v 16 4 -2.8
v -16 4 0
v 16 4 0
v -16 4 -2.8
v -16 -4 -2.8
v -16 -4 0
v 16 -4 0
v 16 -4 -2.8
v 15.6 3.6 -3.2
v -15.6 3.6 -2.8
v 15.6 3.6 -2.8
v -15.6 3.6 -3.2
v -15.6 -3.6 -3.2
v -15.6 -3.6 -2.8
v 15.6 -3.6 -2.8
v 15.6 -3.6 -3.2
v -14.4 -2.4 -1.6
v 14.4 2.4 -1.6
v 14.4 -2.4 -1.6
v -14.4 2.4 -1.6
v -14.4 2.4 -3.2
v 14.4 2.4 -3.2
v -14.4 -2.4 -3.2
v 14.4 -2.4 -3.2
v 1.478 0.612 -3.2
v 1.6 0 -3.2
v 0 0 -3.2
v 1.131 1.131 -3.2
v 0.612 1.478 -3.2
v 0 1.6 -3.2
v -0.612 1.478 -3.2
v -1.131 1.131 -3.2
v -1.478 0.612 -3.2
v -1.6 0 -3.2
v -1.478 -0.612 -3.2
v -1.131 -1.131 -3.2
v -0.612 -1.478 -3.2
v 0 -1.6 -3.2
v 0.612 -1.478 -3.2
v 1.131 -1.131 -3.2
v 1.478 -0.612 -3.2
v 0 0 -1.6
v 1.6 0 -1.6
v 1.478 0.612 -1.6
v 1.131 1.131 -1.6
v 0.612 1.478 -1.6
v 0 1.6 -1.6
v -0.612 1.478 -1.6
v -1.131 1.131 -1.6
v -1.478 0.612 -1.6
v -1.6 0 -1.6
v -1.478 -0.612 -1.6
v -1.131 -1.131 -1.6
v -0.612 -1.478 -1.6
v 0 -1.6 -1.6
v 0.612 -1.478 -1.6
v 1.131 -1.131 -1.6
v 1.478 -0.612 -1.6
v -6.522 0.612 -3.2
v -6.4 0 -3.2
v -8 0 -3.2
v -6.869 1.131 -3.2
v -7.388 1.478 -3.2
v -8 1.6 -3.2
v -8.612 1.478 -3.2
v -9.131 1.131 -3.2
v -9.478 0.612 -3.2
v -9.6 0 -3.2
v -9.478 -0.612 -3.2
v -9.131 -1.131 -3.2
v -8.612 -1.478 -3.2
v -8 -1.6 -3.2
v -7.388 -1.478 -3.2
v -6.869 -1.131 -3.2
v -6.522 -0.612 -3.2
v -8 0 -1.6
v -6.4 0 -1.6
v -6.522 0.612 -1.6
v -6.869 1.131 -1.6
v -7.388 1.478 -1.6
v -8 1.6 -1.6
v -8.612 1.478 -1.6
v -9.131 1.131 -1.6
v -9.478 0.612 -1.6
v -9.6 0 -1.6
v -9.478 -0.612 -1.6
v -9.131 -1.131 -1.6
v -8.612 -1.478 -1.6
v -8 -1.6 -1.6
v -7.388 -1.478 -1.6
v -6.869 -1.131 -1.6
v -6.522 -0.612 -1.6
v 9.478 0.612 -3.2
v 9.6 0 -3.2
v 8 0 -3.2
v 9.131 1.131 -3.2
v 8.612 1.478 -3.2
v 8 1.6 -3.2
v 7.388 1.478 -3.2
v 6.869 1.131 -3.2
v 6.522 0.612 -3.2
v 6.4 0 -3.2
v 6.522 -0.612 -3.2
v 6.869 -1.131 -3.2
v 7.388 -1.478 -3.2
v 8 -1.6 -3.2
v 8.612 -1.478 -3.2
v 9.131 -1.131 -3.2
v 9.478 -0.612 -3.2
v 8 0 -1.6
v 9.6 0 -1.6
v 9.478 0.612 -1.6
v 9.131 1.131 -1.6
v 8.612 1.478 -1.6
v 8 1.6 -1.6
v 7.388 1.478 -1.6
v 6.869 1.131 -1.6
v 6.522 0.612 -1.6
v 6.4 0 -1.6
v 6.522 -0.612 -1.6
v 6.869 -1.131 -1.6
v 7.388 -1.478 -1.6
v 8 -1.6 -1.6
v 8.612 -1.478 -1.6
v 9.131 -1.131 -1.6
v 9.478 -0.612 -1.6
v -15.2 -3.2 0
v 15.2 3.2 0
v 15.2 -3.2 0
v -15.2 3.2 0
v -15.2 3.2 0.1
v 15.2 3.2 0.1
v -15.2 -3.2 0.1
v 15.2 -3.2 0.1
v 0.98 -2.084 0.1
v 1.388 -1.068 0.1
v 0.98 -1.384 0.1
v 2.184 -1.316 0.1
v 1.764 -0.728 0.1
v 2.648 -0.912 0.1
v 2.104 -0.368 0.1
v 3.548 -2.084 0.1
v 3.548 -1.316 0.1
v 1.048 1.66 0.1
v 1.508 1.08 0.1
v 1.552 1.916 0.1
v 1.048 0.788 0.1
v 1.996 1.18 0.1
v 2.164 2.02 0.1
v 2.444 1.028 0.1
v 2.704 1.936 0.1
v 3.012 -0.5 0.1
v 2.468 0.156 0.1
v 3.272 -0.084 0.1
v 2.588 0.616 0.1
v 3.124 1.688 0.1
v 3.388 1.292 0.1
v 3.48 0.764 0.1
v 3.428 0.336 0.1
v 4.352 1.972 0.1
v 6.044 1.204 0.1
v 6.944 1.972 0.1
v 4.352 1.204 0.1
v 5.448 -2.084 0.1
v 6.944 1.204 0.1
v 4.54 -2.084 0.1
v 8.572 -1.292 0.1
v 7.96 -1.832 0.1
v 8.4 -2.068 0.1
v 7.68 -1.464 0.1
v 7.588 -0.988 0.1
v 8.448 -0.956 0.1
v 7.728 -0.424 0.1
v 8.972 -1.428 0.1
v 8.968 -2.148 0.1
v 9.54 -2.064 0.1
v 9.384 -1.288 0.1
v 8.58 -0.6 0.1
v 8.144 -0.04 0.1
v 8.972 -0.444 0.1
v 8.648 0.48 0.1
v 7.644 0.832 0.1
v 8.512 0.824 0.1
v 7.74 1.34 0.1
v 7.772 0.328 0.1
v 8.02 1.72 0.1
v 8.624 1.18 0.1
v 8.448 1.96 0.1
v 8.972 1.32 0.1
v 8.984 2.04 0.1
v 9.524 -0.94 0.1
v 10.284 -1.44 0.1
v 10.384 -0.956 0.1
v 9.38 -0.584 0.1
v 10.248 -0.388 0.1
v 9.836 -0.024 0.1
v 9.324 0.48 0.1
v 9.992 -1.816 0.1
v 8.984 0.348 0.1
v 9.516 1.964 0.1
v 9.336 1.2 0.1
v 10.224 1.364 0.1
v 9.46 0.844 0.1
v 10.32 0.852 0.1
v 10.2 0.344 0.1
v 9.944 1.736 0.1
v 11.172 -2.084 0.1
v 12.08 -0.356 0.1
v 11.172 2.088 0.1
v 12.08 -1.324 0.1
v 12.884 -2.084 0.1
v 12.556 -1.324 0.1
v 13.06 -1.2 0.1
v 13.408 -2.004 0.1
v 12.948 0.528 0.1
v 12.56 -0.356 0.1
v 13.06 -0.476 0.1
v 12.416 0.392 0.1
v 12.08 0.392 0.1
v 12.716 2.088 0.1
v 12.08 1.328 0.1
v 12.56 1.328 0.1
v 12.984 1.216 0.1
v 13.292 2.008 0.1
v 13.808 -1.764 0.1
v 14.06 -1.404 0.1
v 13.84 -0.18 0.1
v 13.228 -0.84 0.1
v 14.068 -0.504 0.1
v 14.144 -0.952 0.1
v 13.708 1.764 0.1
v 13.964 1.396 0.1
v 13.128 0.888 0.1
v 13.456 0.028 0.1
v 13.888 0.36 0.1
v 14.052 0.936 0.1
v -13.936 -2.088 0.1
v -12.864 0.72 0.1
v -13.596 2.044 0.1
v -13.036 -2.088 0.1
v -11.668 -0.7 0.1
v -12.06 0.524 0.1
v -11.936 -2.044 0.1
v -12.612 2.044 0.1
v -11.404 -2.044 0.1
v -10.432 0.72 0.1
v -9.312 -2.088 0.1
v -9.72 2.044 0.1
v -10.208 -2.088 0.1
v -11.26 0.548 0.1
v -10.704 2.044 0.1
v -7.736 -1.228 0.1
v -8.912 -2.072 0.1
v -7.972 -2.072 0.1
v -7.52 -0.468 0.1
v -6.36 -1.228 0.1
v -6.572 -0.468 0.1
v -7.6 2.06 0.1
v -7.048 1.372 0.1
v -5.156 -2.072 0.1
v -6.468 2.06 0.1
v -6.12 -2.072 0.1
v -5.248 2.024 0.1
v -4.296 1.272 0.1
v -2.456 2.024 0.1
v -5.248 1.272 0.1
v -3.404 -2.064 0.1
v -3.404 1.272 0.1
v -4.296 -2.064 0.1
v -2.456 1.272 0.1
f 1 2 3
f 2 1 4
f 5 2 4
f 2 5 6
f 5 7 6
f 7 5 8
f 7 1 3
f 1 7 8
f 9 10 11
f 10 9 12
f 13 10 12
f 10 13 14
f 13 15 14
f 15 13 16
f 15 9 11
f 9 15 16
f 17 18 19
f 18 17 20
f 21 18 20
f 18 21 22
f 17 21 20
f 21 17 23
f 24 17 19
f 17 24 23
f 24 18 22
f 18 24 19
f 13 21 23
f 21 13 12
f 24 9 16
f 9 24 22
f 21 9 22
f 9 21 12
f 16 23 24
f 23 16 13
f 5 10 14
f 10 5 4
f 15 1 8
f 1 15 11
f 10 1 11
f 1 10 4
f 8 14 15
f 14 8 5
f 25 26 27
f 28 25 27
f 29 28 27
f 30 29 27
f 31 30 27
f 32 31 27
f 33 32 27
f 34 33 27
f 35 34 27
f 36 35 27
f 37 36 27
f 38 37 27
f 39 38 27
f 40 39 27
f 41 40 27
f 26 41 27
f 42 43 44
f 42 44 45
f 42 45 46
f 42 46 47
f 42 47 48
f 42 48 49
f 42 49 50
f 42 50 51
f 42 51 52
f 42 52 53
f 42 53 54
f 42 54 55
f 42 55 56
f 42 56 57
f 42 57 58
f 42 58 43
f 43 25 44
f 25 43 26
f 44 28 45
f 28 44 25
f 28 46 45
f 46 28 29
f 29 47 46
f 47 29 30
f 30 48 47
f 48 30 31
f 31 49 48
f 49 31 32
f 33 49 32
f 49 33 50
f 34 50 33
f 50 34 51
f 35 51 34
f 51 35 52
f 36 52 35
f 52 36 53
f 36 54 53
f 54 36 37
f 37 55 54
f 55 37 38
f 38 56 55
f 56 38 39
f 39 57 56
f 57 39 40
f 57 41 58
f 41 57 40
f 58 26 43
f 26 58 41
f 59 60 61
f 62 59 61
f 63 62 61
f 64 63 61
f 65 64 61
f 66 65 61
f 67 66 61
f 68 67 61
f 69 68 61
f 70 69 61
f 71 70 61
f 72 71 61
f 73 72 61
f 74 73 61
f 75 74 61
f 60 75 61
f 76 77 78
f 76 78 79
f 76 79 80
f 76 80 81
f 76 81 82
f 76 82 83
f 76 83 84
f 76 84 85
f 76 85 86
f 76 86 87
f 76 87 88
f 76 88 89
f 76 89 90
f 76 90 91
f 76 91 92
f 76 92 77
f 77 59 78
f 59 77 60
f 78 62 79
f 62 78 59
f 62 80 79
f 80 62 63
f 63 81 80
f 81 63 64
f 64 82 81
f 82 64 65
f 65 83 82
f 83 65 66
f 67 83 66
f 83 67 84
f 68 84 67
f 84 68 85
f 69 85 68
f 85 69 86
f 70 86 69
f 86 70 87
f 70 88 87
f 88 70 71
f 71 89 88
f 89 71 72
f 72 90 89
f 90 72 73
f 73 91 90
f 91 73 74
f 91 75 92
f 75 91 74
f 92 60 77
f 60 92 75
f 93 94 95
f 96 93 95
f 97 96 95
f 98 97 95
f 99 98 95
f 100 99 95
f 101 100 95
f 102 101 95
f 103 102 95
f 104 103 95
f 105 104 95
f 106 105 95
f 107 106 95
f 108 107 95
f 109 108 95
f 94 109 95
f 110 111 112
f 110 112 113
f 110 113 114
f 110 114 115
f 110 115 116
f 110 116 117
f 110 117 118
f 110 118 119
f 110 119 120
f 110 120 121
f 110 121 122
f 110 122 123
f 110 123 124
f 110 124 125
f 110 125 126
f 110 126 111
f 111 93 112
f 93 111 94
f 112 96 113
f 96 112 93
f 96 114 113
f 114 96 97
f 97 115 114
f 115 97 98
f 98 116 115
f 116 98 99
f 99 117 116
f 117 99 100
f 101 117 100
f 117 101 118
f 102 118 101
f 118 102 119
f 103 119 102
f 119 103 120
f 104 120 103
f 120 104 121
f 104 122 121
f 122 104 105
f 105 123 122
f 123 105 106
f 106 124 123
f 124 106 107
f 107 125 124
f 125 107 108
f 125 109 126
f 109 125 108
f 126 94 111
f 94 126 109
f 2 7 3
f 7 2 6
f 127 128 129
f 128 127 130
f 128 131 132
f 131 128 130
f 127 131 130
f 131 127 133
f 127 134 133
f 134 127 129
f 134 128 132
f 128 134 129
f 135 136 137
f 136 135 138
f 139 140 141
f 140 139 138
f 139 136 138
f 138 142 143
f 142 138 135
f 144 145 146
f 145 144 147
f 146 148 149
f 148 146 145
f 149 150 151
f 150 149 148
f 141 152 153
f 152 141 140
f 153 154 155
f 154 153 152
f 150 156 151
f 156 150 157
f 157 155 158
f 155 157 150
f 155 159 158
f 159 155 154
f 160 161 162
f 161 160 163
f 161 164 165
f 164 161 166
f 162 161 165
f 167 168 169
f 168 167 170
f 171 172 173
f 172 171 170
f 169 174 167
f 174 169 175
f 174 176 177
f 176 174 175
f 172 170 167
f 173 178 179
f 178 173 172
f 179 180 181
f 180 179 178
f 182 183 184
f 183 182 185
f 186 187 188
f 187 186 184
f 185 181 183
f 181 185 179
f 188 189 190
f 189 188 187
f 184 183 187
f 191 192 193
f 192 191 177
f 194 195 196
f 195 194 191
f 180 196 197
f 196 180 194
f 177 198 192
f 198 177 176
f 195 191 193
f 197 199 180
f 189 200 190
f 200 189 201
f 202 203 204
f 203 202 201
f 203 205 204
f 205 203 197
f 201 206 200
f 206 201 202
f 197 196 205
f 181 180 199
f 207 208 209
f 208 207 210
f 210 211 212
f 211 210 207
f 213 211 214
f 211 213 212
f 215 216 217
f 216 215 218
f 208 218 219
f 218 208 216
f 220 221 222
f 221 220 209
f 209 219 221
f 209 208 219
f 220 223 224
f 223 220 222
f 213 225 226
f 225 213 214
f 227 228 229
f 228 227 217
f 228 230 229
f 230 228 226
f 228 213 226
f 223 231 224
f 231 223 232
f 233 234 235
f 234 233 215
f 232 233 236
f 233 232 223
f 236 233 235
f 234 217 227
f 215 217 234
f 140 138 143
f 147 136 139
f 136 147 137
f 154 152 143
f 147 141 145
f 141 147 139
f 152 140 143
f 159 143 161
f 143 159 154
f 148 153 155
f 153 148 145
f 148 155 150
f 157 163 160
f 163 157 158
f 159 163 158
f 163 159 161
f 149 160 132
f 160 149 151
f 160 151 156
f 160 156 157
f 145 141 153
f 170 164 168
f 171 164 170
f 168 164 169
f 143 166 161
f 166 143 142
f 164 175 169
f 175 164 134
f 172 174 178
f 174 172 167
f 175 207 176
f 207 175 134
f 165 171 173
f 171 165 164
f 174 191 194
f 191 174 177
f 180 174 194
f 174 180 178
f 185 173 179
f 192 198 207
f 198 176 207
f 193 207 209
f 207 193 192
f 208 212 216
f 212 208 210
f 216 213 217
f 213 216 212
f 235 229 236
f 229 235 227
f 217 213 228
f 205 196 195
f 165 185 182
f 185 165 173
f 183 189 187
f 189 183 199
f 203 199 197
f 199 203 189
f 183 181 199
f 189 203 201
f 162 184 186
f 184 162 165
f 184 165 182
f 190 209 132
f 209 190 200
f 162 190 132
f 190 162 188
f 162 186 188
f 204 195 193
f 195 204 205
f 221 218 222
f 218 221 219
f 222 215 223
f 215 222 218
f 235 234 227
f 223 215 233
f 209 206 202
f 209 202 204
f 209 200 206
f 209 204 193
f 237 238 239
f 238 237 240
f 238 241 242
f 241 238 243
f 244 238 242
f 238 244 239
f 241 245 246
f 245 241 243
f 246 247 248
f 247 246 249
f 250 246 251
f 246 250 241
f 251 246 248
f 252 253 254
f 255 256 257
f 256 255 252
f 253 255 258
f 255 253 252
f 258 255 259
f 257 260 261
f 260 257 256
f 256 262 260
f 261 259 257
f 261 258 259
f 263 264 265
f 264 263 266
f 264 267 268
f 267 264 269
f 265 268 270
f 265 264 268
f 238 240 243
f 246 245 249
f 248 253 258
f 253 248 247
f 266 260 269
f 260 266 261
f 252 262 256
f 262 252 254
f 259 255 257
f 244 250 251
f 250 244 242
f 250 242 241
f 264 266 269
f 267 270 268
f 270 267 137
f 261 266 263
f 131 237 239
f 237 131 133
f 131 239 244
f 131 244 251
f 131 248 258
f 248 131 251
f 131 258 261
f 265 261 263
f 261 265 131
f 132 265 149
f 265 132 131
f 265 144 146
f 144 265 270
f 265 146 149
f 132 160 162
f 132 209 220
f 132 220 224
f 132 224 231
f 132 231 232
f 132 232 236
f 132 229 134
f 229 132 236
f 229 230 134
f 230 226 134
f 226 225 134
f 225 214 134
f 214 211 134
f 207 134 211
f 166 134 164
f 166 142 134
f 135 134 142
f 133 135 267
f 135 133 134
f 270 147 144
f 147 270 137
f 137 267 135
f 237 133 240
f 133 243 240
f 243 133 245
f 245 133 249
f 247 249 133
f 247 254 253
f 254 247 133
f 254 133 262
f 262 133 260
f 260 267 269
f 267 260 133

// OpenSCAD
// file: ../p/4-4edge.scad
use <../lib.scad>
function ldraw_lib__4_4edge() = [
// 0 Circle 1.0
// 0 Name: 4-4edge.dat
// 0 Author: James Jessiman
// 0 !LDRAW_ORG Primitive UPDATE 2017-01
// 0 !LICENSE Licensed under CC BY 2.0 and CC BY 4.0 : see CAreadme.txt
// 
// 0 BFC CERTIFY CCW
  [0,"BFC","CERTIFY"],
  [0,"BFC","CCW"],
// 
// 0 !HISTORY 1998-12-15 [PTadmin] Official Update 1998-10
// 0 !HISTORY 2005-12-28 [PTadmin] Official Update 2005-01
// 0 !HISTORY 2007-06-24 [PTadmin] Header formatted for Contributor Agreement
// 0 !HISTORY 2008-07-01 [PTadmin] Official Update 2008-01
// 0 !HISTORY 2017-01-15 [Steffen] BFCed
// 0 !HISTORY 2017-12-30 [PTadmin] Official Update 2017-01
// 
// 
// 2 24 1 0 0 0.9239 0 0.3827
  [2,24,1,0,0,0.9239,0,0.3827],
// 2 24 0.9239 0 0.3827 0.7071 0 0.7071
  [2,24,0.9239,0,0.3827,0.7071,0,0.7071],
// 2 24 0.7071 0 0.7071 0.3827 0 0.9239
  [2,24,0.7071,0,0.7071,0.3827,0,0.9239],
// 2 24 0.3827 0 0.9239 0 0 1
  [2,24,0.3827,0,0.9239,0,0,1],
// 2 24 0 0 1 -0.3827 0 0.9239
  [2,24,0,0,1,-0.3827,0,0.9239],
// 2 24 -0.3827 0 0.9239 -0.7071 0 0.7071
  [2,24,-0.3827,0,0.9239,-0.7071,0,0.7071],
// 2 24 -0.7071 0 0.7071 -0.9239 0 0.3827
  [2,24,-0.7071,0,0.7071,-0.9239,0,0.3827],
// 2 24 -0.9239 0 0.3827 -1 0 -0
  [2,24,-0.9239,0,0.3827,-1,0,-0],
// 2 24 -1 0 -0 -0.9239 0 -0.3827
  [2,24,-1,0,-0,-0.9239,0,-0.3827],
// 2 24 -0.9239 0 -0.3827 -0.7071 0 -0.7071
  [2,24,-0.9239,0,-0.3827,-0.7071,0,-0.7071],
// 2 24 -0.7071 0 -0.7071 -0.3827 0 -0.9239
  [2,24,-0.7071,0,-0.7071,-0.3827,0,-0.9239],
// 2 24 -0.3827 0 -0.9239 0 0 -1
  [2,24,-0.3827,0,-0.9239,0,0,-1],
// 2 24 0 0 -1 0.3827 0 -0.9239
  [2,24,0,0,-1,0.3827,0,-0.9239],
// 2 24 0.3827 0 -0.9239 0.7071 0 -0.7071
  [2,24,0.3827,0,-0.9239,0.7071,0,-0.7071],
// 2 24 0.7071 0 -0.7071 0.9239 0 -0.3827
  [2,24,0.7071,0,-0.7071,0.9239,0,-0.3827],
// 2 24 0.9239 0 -0.3827 1 0 0
  [2,24,0.9239,0,-0.3827,1,0,0],
];
module ldraw_lib__4_4edge(step=0, col=false, unit=2/5, alt=false, line=0.2, solid=!$preview)
    makepoly(ldraw_lib__4_4edge(), step=step, col=col, unit=unit, alt=alt, line=line, solid=solid);
ldraw_lib__4_4edge(line=0.2);
// file: ../p/4-4disc.scad
use <../lib.scad>
function ldraw_lib__4_4disc() = [
// 0 Disc 1.0
// 0 Name: 4-4disc.dat
// 0 Author: James Jessiman
// 0 !LDRAW_ORG Primitive UPDATE 2002-02
// 0 !LICENSE Licensed under CC BY 2.0 and CC BY 4.0 : see CAreadme.txt
// 
// 0 BFC CERTIFY CCW
  [0,"BFC","CERTIFY"],
  [0,"BFC","CCW"],
// 
// 0 !HISTORY 1998-12-15 [PTadmin] Official Update 1998-10
// 0 !HISTORY 2002-03-23 [sbliss] Added BFC statement
// 0 !HISTORY 2002-04-25 [PTadmin] Official Update 2002-02
// 0 !HISTORY 2007-06-24 [PTadmin] Header formatted for Contributor Agreement
// 0 !HISTORY 2008-07-01 [PTadmin] Official Update 2008-01
// 
// 
// 3 16 0 0 0 1 0 0 0.9239 0 0.3827
  [3,16,0,0,0,1,0,0,0.9239,0,0.3827],
// 3 16 0 0 0 0.9239 0 0.3827 0.7071 0 0.7071
  [3,16,0,0,0,0.9239,0,0.3827,0.7071,0,0.7071],
// 3 16 0 0 0 0.7071 0 0.7071 0.3827 0 0.9239
  [3,16,0,0,0,0.7071,0,0.7071,0.3827,0,0.9239],
// 3 16 0 0 0 0.3827 0 0.9239 0 0 1
  [3,16,0,0,0,0.3827,0,0.9239,0,0,1],
// 3 16 0 0 0 0 0 1 -0.3827 0 0.9239
  [3,16,0,0,0,0,0,1,-0.3827,0,0.9239],
// 3 16 0 0 0 -0.3827 0 0.9239 -0.7071 0 0.7071
  [3,16,0,0,0,-0.3827,0,0.9239,-0.7071,0,0.7071],
// 3 16 0 0 0 -0.7071 0 0.7071 -0.9239 0 0.3827
  [3,16,0,0,0,-0.7071,0,0.7071,-0.9239,0,0.3827],
// 3 16 0 0 0 -0.9239 0 0.3827 -1 0 -0
  [3,16,0,0,0,-0.9239,0,0.3827,-1,0,-0],
// 3 16 0 0 0 -1 0 -0 -0.9239 0 -0.3827
  [3,16,0,0,0,-1,0,-0,-0.9239,0,-0.3827],
// 3 16 0 0 0 -0.9239 0 -0.3827 -0.7071 0 -0.7071
  [3,16,0,0,0,-0.9239,0,-0.3827,-0.7071,0,-0.7071],
// 3 16 0 0 0 -0.7071 0 -0.7071 -0.3827 0 -0.9239
  [3,16,0,0,0,-0.7071,0,-0.7071,-0.3827,0,-0.9239],
// 3 16 0 0 0 -0.3827 0 -0.9239 0 0 -1
  [3,16,0,0,0,-0.3827,0,-0.9239,0,0,-1],
// 3 16 0 0 0 0 0 -1 0.3827 0 -0.9239
  [3,16,0,0,0,0,0,-1,0.3827,0,-0.9239],
// 3 16 0 0 0 0.3827 0 -0.9239 0.7071 0 -0.7071
  [3,16,0,0,0,0.3827,0,-0.9239,0.7071,0,-0.7071],
// 3 16 0 0 0 0.7071 0 -0.7071 0.9239 0 -0.3827
  [3,16,0,0,0,0.7071,0,-0.7071,0.9239,0,-0.3827],
// 3 16 0 0 0 0.9239 0 -0.3827 1 0 0
  [3,16,0,0,0,0.9239,0,-0.3827,1,0,0],
// 0
];
module ldraw_lib__4_4disc(step=0, col=false, unit=2/5, alt=false, line=0.2, solid=!$preview)
    makepoly(ldraw_lib__4_4disc(), step=step, col=col, unit=unit, alt=alt, line=line, solid=solid);
ldraw_lib__4_4disc(line=0.2);
// file: ../p/4-4cyli.scad
use <../lib.scad>
$fa=1; $fs=0.2;
function ldraw_lib__4_4cyli(realsolid=false) = [
// 0 Cylinder 1.0
// 0 Name: 4-4cyli.dat
// 0 Author: James Jessiman
// 0 !LDRAW_ORG Primitive UPDATE 2005-01
// 0 !LICENSE Licensed under CC BY 2.0 and CC BY 4.0 : see CAreadme.txt
// 
// 0 BFC CERTIFY CCW
  [0,"BFC","CERTIFY"],
  [0,"BFC","CCW"],
// 
// 0 !HISTORY 1998-12-15 [PTadmin] Official Update 1998-10
// 0 !HISTORY 2002-03-23 [sbliss] Added BFC statement; merged headers from files in distributions LDraw 0.27 and Complete.
// 0 !HISTORY 2002-04-25 [PTadmin] Official Update 2002-02
// 0 !HISTORY 2004-12-14 [guyvivan] BFC CCW
// 0 !HISTORY 2005-12-28 [PTadmin] Official Update 2005-01
// 0 !HISTORY 2007-06-24 [PTadmin] Header formatted for Contributor Agreement
// 0 !HISTORY 2008-07-01 [PTadmin] Official Update 2008-01
// 
// 
// 4 16 1 1 0 0.9239 1 0.3827 0.9239 0 0.3827 1 0 0
  [4,16,1,1,0,0.9239,1,0.3827,0.9239,0,0.3827,1,0,0],
// 5 24 1 0 0 1 1 0 0.9239 0 0.3827 0.9239 0 -0.3827
  [5,24,1,0,0,1,1,0,0.9239,0,0.3827,0.9239,0,-0.3827],
// 4 16 0.9239 1 0.3827 0.7071 1 0.7071 0.7071 0 0.7071 0.9239 0 0.3827
  [4,16,0.9239,1,0.3827,0.7071,1,0.7071,0.7071,0,0.7071,0.9239,0,0.3827],
// 5 24 0.9239 0 0.3827 0.9239 1 0.3827 0.7071 0 0.7071 1 0 0
  [5,24,0.9239,0,0.3827,0.9239,1,0.3827,0.7071,0,0.7071,1,0,0],
// 4 16 0.7071 1 0.7071 0.3827 1 0.9239 0.3827 0 0.9239 0.7071 0 0.7071
  [4,16,0.7071,1,0.7071,0.3827,1,0.9239,0.3827,0,0.9239,0.7071,0,0.7071],
// 5 24 0.7071 0 0.7071 0.7071 1 0.7071 0.3827 0 0.9239 0.9239 0 0.3827
  [5,24,0.7071,0,0.7071,0.7071,1,0.7071,0.3827,0,0.9239,0.9239,0,0.3827],
// 4 16 0.3827 1 0.9239 0 1 1 0 0 1 0.3827 0 0.9239
  [4,16,0.3827,1,0.9239,0,1,1,0,0,1,0.3827,0,0.9239],
// 5 24 0.3827 0 0.9239 0.3827 1 0.9239 0 0 1 0.7071 0 0.7071
  [5,24,0.3827,0,0.9239,0.3827,1,0.9239,0,0,1,0.7071,0,0.7071],
// 4 16 0 1 1 -0.3827 1 0.9239 -0.3827 0 0.9239 0 0 1
  [4,16,0,1,1,-0.3827,1,0.9239,-0.3827,0,0.9239,0,0,1],
// 5 24 0 0 1 0 1 1 -0.3827 0 0.9239 0.3827 0 0.9239
  [5,24,0,0,1,0,1,1,-0.3827,0,0.9239,0.3827,0,0.9239],
// 4 16 -0.3827 1 0.9239 -0.7071 1 0.7071 -0.7071 0 0.7071 -0.3827 0 0.9239
  [4,16,-0.3827,1,0.9239,-0.7071,1,0.7071,-0.7071,0,0.7071,-0.3827,0,0.9239],
// 5 24 -0.3827 0 0.9239 -0.3827 1 0.9239 -0.7071 0 0.7071 0 0 1
  [5,24,-0.3827,0,0.9239,-0.3827,1,0.9239,-0.7071,0,0.7071,0,0,1],
// 4 16 -0.7071 1 0.7071 -0.9239 1 0.3827 -0.9239 0 0.3827 -0.7071 0 0.7071
  [4,16,-0.7071,1,0.7071,-0.9239,1,0.3827,-0.9239,0,0.3827,-0.7071,0,0.7071],
// 5 24 -0.7071 0 0.7071 -0.7071 1 0.7071 -0.9239 0 0.3827 -0.3827 0 0.9239
  [5,24,-0.7071,0,0.7071,-0.7071,1,0.7071,-0.9239,0,0.3827,-0.3827,0,0.9239],
// 4 16 -0.9239 1 0.3827 -1 1 0 -1 0 0 -0.9239 0 0.3827
  [4,16,-0.9239,1,0.3827,-1,1,0,-1,0,0,-0.9239,0,0.3827],
// 5 24 -0.9239 0 0.3827 -0.9239 1 0.3827 -1 0 0 -0.7071 0 0.7071
  [5,24,-0.9239,0,0.3827,-0.9239,1,0.3827,-1,0,0,-0.7071,0,0.7071],
// 4 16 -1 1 0 -0.9239 1 -0.3827 -0.9239 0 -0.3827 -1 0 0
  [4,16,-1,1,0,-0.9239,1,-0.3827,-0.9239,0,-0.3827,-1,0,0],
// 5 24 -1 0 0 -1 1 0 -0.9239 0 -0.3827 -0.9239 0 0.3827
  [5,24,-1,0,0,-1,1,0,-0.9239,0,-0.3827,-0.9239,0,0.3827],
// 4 16 -0.9239 1 -0.3827 -0.7071 1 -0.7071 -0.7071 0 -0.7071 -0.9239 0 -0.3827
  [4,16,-0.9239,1,-0.3827,-0.7071,1,-0.7071,-0.7071,0,-0.7071,-0.9239,0,-0.3827],
// 5 24 -0.9239 0 -0.3827 -0.9239 1 -0.3827 -0.7071 0 -0.7071 -1 0 0
  [5,24,-0.9239,0,-0.3827,-0.9239,1,-0.3827,-0.7071,0,-0.7071,-1,0,0],
// 4 16 -0.7071 1 -0.7071 -0.3827 1 -0.9239 -0.3827 0 -0.9239 -0.7071 0 -0.7071
  [4,16,-0.7071,1,-0.7071,-0.3827,1,-0.9239,-0.3827,0,-0.9239,-0.7071,0,-0.7071],
// 5 24 -0.7071 0 -0.7071 -0.7071 1 -0.7071 -0.3827 0 -0.9239 -0.9239 0 -0.3827
  [5,24,-0.7071,0,-0.7071,-0.7071,1,-0.7071,-0.3827,0,-0.9239,-0.9239,0,-0.3827],
// 4 16 -0.3827 1 -0.9239 0 1 -1 0 0 -1 -0.3827 0 -0.9239
  [4,16,-0.3827,1,-0.9239,0,1,-1,0,0,-1,-0.3827,0,-0.9239],
// 5 24 -0.3827 0 -0.9239 -0.3827 1 -0.9239 0 0 -1 -0.7071 0 -0.7071
  [5,24,-0.3827,0,-0.9239,-0.3827,1,-0.9239,0,0,-1,-0.7071,0,-0.7071],
// 4 16 0 1 -1 0.3827 1 -0.9239 0.3827 0 -0.9239 0 0 -1
  [4,16,0,1,-1,0.3827,1,-0.9239,0.3827,0,-0.9239,0,0,-1],
// 5 24 0 0 -1 0 1 -1 0.3827 0 -0.9239 -0.3827 0 -0.9239
  [5,24,0,0,-1,0,1,-1,0.3827,0,-0.9239,-0.3827,0,-0.9239],
// 4 16 0.3827 1 -0.9239 0.7071 1 -0.7071 0.7071 0 -0.7071 0.3827 0 -0.9239
  [4,16,0.3827,1,-0.9239,0.7071,1,-0.7071,0.7071,0,-0.7071,0.3827,0,-0.9239],
// 5 24 0.3827 0 -0.9239 0.3827 1 -0.9239 0.7071 0 -0.7071 0 0 -1
  [5,24,0.3827,0,-0.9239,0.3827,1,-0.9239,0.7071,0,-0.7071,0,0,-1],
// 4 16 0.7071 1 -0.7071 0.9239 1 -0.3827 0.9239 0 -0.3827 0.7071 0 -0.7071
  [4,16,0.7071,1,-0.7071,0.9239,1,-0.3827,0.9239,0,-0.3827,0.7071,0,-0.7071],
// 5 24 0.7071 0 -0.7071 0.7071 1 -0.7071 0.9239 0 -0.3827 0.3827 0 -0.9239
  [5,24,0.7071,0,-0.7071,0.7071,1,-0.7071,0.9239,0,-0.3827,0.3827,0,-0.9239],
// 4 16 0.9239 1 -0.3827 1 1 0 1 0 0 0.9239 0 -0.3827
  [4,16,0.9239,1,-0.3827,1,1,0,1,0,0,0.9239,0,-0.3827],
// 5 24 0.9239 0 -0.3827 0.9239 1 -0.3827 1 0 0 0.7071 0 -0.7071
  [5,24,0.9239,0,-0.3827,0.9239,1,-0.3827,1,0,0,0.7071,0,-0.7071],
// 0
];
module ldraw_lib__4_4cyli(step=0, col=false, unit=2/5, alt=false, line=0.2, solid=!$preview)
    makepoly(ldraw_lib__4_4cyli(solid), step=step, col=col, unit=unit, alt=alt, line=line, solid=solid);
ldraw_lib__4_4cyli(line=0.2);
// file: ../p/stud3.scad
use <../lib.scad>
use <4-4cyli.scad>
use <4-4disc.scad>
use <4-4edge.scad>
function ldraw_lib__stud3() = [
// 0 Stud Tube Solid
// 0 Name: stud3.dat
// 0 Author: James Jessiman
// 0 !LDRAW_ORG Primitive UPDATE 2012-01
// 0 !LICENSE Licensed under CC BY 4.0 : see CAreadme.txt
// 
// 0 BFC CERTIFY CCW
  [0,"BFC","CERTIFY"],
  [0,"BFC","CCW"],
// 
// 0 !HISTORY 2002-04-04 [sbliss] Modified for BFC compliance
// 0 !HISTORY 2002-04-25 [PTadmin] Official Update 2002-02
// 0 !HISTORY 2007-06-24 [PTadmin] Header formatted for Contributor Agreement
// 0 !HISTORY 2008-07-01 [PTadmin] Official Update 2008-01
// 0 !HISTORY 2012-02-16 [Philo] Changed to CCW
// 0 !HISTORY 2012-03-30 [PTadmin] Official Update 2012-01
// 
// 
// 1 16 0 -4 0 4 0 0 0 1 0 0 0 4 4-4edge.dat
  [1,16,0,-4,0,4,0,0,0,1,0,0,0,4, ldraw_lib__4_4edge()],
// 1 16 0 0 0 4 0 0 0 1 0 0 0 4 4-4edge.dat
  [1,16,0,0,0,4,0,0,0,1,0,0,0,4, ldraw_lib__4_4edge()],
// 1 16 0 -4 0 4 0 0 0 1 0 0 0 4 4-4disc.dat
  [1,16,0,-4,0,4,0,0,0,1,0,0,0,4, ldraw_lib__4_4disc()],
  [-1,16,0,0,0,4,0,0,0,-1,0,0,0,4, ldraw_lib__4_4disc()],
// 1 16 0 -4 0 4 0 0 0 4 0 0 0 4 4-4cyli.dat
  [1,16,0,-4,0,4,0,0,0,4,0,0,0,4, ldraw_lib__4_4cyli()],
];
module ldraw_lib__stud3(step=0, col=false, unit=2/5, alt=false, line=0.2, solid=!$preview)
    makepoly(ldraw_lib__stud3(), step=step, col=col, unit=unit, alt=alt, line=line, solid=solid);
ldraw_lib__stud3(line=0.2);
// file: ../p/box5.scad
use <../lib.scad>
function ldraw_lib__box5() = [
// 0 Box with 5 Faces and All Edges
// 0 Name: box5.dat
// 0 Author: James Jessiman
// 0 !LDRAW_ORG Primitive UPDATE 2012-01
// 0 !LICENSE Licensed under CC BY 2.0 and CC BY 4.0 : see CAreadme.txt
// 
// 0 BFC CERTIFY CCW
  [0,"BFC","CERTIFY"],
  [0,"BFC","CCW"],
// 
// 0 !HISTORY 2002-04-03 [sbliss] Modified for BFC compliance
// 0 !HISTORY 2002-04-25 [PTadmin] Official Update 2002-02
// 0 !HISTORY 2007-06-24 [PTadmin] Header formatted for Contributor Agreement
// 0 !HISTORY 2008-07-01 [PTadmin] Official Update 2008-01
// 0 !HISTORY 2012-02-16 [Philo] Changed to CCW
// 0 !HISTORY 2012-03-30 [PTadmin] Official Update 2012-01
// 
// 
// 2 24 1 1 1 -1 1 1
  [2,24,1,1,1,-1,1,1],
// 2 24 -1 1 1 -1 1 -1
  [2,24,-1,1,1,-1,1,-1],
// 2 24 -1 1 -1 1 1 -1
  [2,24,-1,1,-1,1,1,-1],
// 2 24 1 1 -1 1 1 1
  [2,24,1,1,-1,1,1,1],
// 2 24 1 0 1 -1 0 1
  [2,24,1,0,1,-1,0,1],
// 2 24 -1 0 1 -1 0 -1
  [2,24,-1,0,1,-1,0,-1],
// 2 24 -1 0 -1 1 0 -1
  [2,24,-1,0,-1,1,0,-1],
// 2 24 1 0 -1 1 0 1
  [2,24,1,0,-1,1,0,1],
// 2 24 1 0 1 1 1 1
  [2,24,1,0,1,1,1,1],
// 2 24 -1 0 1 -1 1 1
  [2,24,-1,0,1,-1,1,1],
// 2 24 1 0 -1 1 1 -1
  [2,24,1,0,-1,1,1,-1],
// 2 24 -1 0 -1 -1 1 -1
  [2,24,-1,0,-1,-1,1,-1],
// 4 16 -1 1 1 1 1 1 1 1 -1 -1 1 -1
  [4,16,-1,1,1,1,1,1,1,1,-1,-1,1,-1],
// 4 16 -1 1 1 -1 0 1 1 0 1 1 1 1
  [4,16,-1,1,1,-1,0,1,1,0,1,1,1,1],
// 4 16 -1 1 -1 -1 0 -1 -1 0 1 -1 1 1
  [4,16,-1,1,-1,-1,0,-1,-1,0,1,-1,1,1],
// 4 16 1 1 -1 1 0 -1 -1 0 -1 -1 1 -1
  [4,16,1,1,-1,1,0,-1,-1,0,-1,-1,1,-1],
// 4 16 1 1 1 1 0 1 1 0 -1 1 1 -1
  [4,16,1,1,1,1,0,1,1,0,-1,1,1,-1],
];
makepoly(ldraw_lib__box5(), line=0.2);
// file: ../p/box4.scad
use <../lib.scad>
function ldraw_lib__box4() = [
// 0 Box with 4 Faces (2 Parallel Pairs) and All Edges
// 0 Name: box4.dat
// 0 Author: James Jessiman
// 0 !LDRAW_ORG Primitive UPDATE 2012-01
// 0 !LICENSE Licensed under CC BY 4.0 : see CAreadme.txt
// 
// 0 BFC CERTIFY CCW
  [0,"BFC","CERTIFY"],
  [0,"BFC","CCW"],
// 
// 0 !HISTORY 2002-04-03 [sbliss] Modified for BFC compliance
// 0 !HISTORY 2002-04-25 [PTadmin] Official Update 2002-02
// 0 !HISTORY 2007-06-24 [PTadmin] Header formatted for Contributor Agreement
// 0 !HISTORY 2008-07-01 [PTadmin] Official Update 2008-01
// 0 !HISTORY 2012-02-16 [Philo] Changed to CCW
// 0 !HISTORY 2012-03-30 [PTadmin] Official Update 2012-01
// 
// 
// 2 24 1 1 1 -1 1 1
  [2,24,1,1,1,-1,1,1],
// 2 24 -1 1 1 -1 1 -1
  [2,24,-1,1,1,-1,1,-1],
// 2 24 -1 1 -1 1 1 -1
  [2,24,-1,1,-1,1,1,-1],
// 2 24 1 1 -1 1 1 1
  [2,24,1,1,-1,1,1,1],
// 2 24 1 0 1 -1 0 1
  [2,24,1,0,1,-1,0,1],
// 2 24 -1 0 1 -1 0 -1
  [2,24,-1,0,1,-1,0,-1],
// 2 24 -1 0 -1 1 0 -1
  [2,24,-1,0,-1,1,0,-1],
// 2 24 1 0 -1 1 0 1
  [2,24,1,0,-1,1,0,1],
// 2 24 1 0 1 1 1 1
  [2,24,1,0,1,1,1,1],
// 2 24 -1 0 1 -1 1 1
  [2,24,-1,0,1,-1,1,1],
// 2 24 1 0 -1 1 1 -1
  [2,24,1,0,-1,1,1,-1],
// 2 24 -1 0 -1 -1 1 -1
  [2,24,-1,0,-1,-1,1,-1],
// 4 16 -1 1 1 -1 0 1 1 0 1 1 1 1
  [4,16,-1,1,1,-1,0,1,1,0,1,1,1,1],
// 4 16 -1 1 -1 -1 0 -1 -1 0 1 -1 1 1
  [4,16,-1,1,-1,-1,0,-1,-1,0,1,-1,1,1],
// 4 16 1 1 -1 1 0 -1 -1 0 -1 -1 1 -1
  [4,16,1,1,-1,1,0,-1,-1,0,-1,-1,1,-1],
// 4 16 1 1 1 1 0 1 1 0 -1 1 1 -1
  [4,16,1,1,1,1,0,1,1,0,-1,1,1,-1],
];
module ldraw_lib__box4(step=0, col=false, unit=2/5, alt=false, line=0.2, solid=!$preview)
    makepoly(ldraw_lib__box4(), step=step, col=col, unit=unit, alt=alt, line=line, solid=solid);
ldraw_lib__box4(line=0.2);
// file: ../p/box5-12.scad
use <../lib.scad>
function ldraw_lib__box5_12() = [
// 0 Box with 5 Faces without Any Edges
// 0 Name: box5-12.dat
// 0 Author: Chris Dee [cwdee]
// 0 !LDRAW_ORG Primitive UPDATE 2009-02
// 0 !LICENSE Licensed under CC BY 2.0 and CC BY 4.0 : see CAreadme.txt
// 
// 0 BFC CERTIFY CCW
  [0,"BFC","CERTIFY"],
  [0,"BFC","CCW"],
// 
// 0 !HISTORY 2009-09-03 [PTadmin] Official Update 2009-02
// 
// 
// 4 16 1 1 1 1 1 -1 -1 1 -1 -1 1 1
  [4,16,1,1,1,1,1,-1,-1,1,-1,-1,1,1],
// 4 16 -1 0 1 1 0 1 1 1 1 -1 1 1
  [4,16,-1,0,1,1,0,1,1,1,1,-1,1,1],
// 4 16 -1 0 -1 -1 0 1 -1 1 1 -1 1 -1
  [4,16,-1,0,-1,-1,0,1,-1,1,1,-1,1,-1],
// 4 16 1 0 -1 -1 0 -1 -1 1 -1 1 1 -1
  [4,16,1,0,-1,-1,0,-1,-1,1,-1,1,1,-1],
// 4 16 1 0 1 1 0 -1 1 1 -1 1 1 1
  [4,16,1,0,1,1,0,-1,1,1,-1,1,1,1],
// 0
];
module ldraw_lib__box5_12(step=0, col=false, unit=2/5, alt=false, line=0.2, solid=!$preview)
    makepoly(ldraw_lib__box5_12(), step=step, col=col, unit=unit, alt=alt, line=line, solid=solid);
ldraw_lib__box5_12(line=0.2);
// file: s/2431s01.scad
use <../../lib.scad>
use <../../p/box4.scad>
use <../../p/box5.scad>
use <../../p/stud3.scad>
function ldraw_lib__s__2431s01() = [
// 0 ~Tile  1 x  4 with Groove without Top Face
// 0 Name: s\2431s01.dat
// 0 Author: Santeri Piippo [arezey]
// 0 !LDRAW_ORG Subpart UPDATE 2010-02
// 0 !LICENSE Licensed under CC BY 2.0 and CC BY 4.0 : see CAreadme.txt
// 
// 0 BFC CERTIFY CCW
  [0,"BFC","CERTIFY"],
  [0,"BFC","CCW"],
// 
// 0 !HISTORY 2010-07-05 [PTadmin] Official Update 2010-02
// 
// 
// 1 16 0 0 0 40 0 0 0 7 0 0 0 10 box4.dat
  [1,16,0,0,0,40,0,0,0,7,0,0,0,10, ldraw_lib__box4()],
// 1 16 0 7 0 39 0 0 0 1 0 0 0 9 box4.dat
  [1,16,0,7,0,39,0,0,0,1,0,0,0,9, ldraw_lib__box4()],
// 0 BFC INVERTNEXT
  [0,"BFC","INVERTNEXT"],
// 1 16 0 8 0 36 0 0 0 -4 0 0 0 6 box5.dat
  [1,16,0,8,0,36,0,0,0,-4,0,0,0,6, ldraw_lib__box5()],
// 4 16 -39 8 9 -36 8 6 -36 8 -6 -39 8 -9
  [4,16,-39,8,9,-36,8,6,-36,8,-6,-39,8,-9],
// 4 16 39 8 -9 36 8 -6 36 8 6 39 8 9
  [4,16,39,8,-9,36,8,-6,36,8,6,39,8,9],
// 4 16 39 8 9 36 8 6 -36 8 6 -39 8 9
  [4,16,39,8,9,36,8,6,-36,8,6,-39,8,9],
// 4 16 -39 8 -9 -36 8 -6 36 8 -6 39 8 -9
  [4,16,-39,8,-9,-36,8,-6,36,8,-6,39,8,-9],
// 4 16 -40 7 10 -39 7 9 -39 7 -9 -40 7 -10
  [4,16,-40,7,10,-39,7,9,-39,7,-9,-40,7,-10],
// 4 16 40 7 -10 39 7 -9 39 7 9 40 7 10
  [4,16,40,7,-10,39,7,-9,39,7,9,40,7,10],
// 4 16 40 7 10 39 7 9 -39 7 9 -40 7 10
  [4,16,40,7,10,39,7,9,-39,7,9,-40,7,10],
// 4 16 -40 7 -10 -39 7 -9 39 7 -9 40 7 -10
  [4,16,-40,7,-10,-39,7,-9,39,7,-9,40,7,-10],
// 1 16 0 4 0 1 0 0 0 -1 0 0 0 1 stud3.dat
  [1,16,0,4,0,1,0,0,0,-1,0,0,0,1, ldraw_lib__stud3()],
// 1 16 -20 4 0 1 0 0 0 -1 0 0 0 1 stud3.dat
  [1,16,-20,4,0,1,0,0,0,-1,0,0,0,1, ldraw_lib__stud3()],
// 1 16 20 4 0 1 0 0 0 -1 0 0 0 1 stud3.dat
  [1,16,20,4,0,1,0,0,0,-1,0,0,0,1, ldraw_lib__stud3()],
// 0 //
];
makepoly(ldraw_lib__s__2431s01(), line=0.2);
// file: 2431.scad
use <../lib.scad>
use <s/2431s01.scad>
function ldraw_lib__2431() = [
// 0 Tile  1 x  4 with Groove
// 0 Name: 2431.dat
// 0 Author: Santeri Piippo [arezey]
// 0 !LDRAW_ORG Part UPDATE 2010-02
// 0 !LICENSE Licensed under CC BY 2.0 and CC BY 4.0 : see CAreadme.txt
// 
// 0 BFC CERTIFY CCW
  [0,"BFC","CERTIFY"],
  [0,"BFC","CCW"],
// 
// 0 !HISTORY 2010-07-05 [PTadmin] Official Update 2010-02
// 
// 
// 1 16 0 0 0 1 0 0 0 1 0 0 0 1 s\2431s01.dat
  [1,16,0,0,0,1,0,0,0,1,0,0,0,1, ldraw_lib__s__2431s01()],
// 4 16 40 0 -10 40 0 10 -40 0 10 -40 0 -10
  [4,16,40,0,-10,40,0,10,-40,0,10,-40,0,-10],
// 0 //
];
makepoly(ldraw_lib__2431(), line=0.2);
// main file
use <../lib.scad>
use <2431.scad>
use <6153754i.scad>
function ldraw_lib__2431d13() = [
// 0 Tile  1 x  4 with White "MAT 278B" on Black Background Sticker
// 0 Name: 2431d13.dat
// 0 Author: Evert-Jan Boer [ejboer]
// 0 !LDRAW_ORG Shortcut UPDATE 2026-07
// 0 !LICENSE Licensed under CC BY 4.0 : see CAreadme.txt
// 
// 0 BFC CERTIFY CCW
  [0,"BFC","CERTIFY"],
  [0,"BFC","CCW"],
// 
// 0 !CATEGORY Sticker Shortcut
// 0 !KEYWORDS Bricklink 2431pb0488, set 10252, Volkswagen Beetle
// 
// 0 !HISTORY 2026-07-30 [OrionP] Official Update 2026-07
// 
// 1 16 0 0 0 1 0 0 0 1 0 0 0 1 2431.dat
  [1,16,0,0,0,1,0,0,0,1,0,0,0,1, ldraw_lib__2431()],
// 1 16 0 0 0 1 0 0 0 1 0 0 0 1 6153754i.dat
  [1,16,0,0,0,1,0,0,0,1,0,0,0,1, ldraw_lib__6153754i()],
];
module ldraw_lib__2431d13(step=0, col=false, unit=2/5, alt=false, line=0.2, solid=!$preview)
    makepoly(ldraw_lib__2431d13(), step=step, col=col, unit=unit, alt=alt, line=line, solid=solid);
ldraw_lib__2431d13(line=0.2);
